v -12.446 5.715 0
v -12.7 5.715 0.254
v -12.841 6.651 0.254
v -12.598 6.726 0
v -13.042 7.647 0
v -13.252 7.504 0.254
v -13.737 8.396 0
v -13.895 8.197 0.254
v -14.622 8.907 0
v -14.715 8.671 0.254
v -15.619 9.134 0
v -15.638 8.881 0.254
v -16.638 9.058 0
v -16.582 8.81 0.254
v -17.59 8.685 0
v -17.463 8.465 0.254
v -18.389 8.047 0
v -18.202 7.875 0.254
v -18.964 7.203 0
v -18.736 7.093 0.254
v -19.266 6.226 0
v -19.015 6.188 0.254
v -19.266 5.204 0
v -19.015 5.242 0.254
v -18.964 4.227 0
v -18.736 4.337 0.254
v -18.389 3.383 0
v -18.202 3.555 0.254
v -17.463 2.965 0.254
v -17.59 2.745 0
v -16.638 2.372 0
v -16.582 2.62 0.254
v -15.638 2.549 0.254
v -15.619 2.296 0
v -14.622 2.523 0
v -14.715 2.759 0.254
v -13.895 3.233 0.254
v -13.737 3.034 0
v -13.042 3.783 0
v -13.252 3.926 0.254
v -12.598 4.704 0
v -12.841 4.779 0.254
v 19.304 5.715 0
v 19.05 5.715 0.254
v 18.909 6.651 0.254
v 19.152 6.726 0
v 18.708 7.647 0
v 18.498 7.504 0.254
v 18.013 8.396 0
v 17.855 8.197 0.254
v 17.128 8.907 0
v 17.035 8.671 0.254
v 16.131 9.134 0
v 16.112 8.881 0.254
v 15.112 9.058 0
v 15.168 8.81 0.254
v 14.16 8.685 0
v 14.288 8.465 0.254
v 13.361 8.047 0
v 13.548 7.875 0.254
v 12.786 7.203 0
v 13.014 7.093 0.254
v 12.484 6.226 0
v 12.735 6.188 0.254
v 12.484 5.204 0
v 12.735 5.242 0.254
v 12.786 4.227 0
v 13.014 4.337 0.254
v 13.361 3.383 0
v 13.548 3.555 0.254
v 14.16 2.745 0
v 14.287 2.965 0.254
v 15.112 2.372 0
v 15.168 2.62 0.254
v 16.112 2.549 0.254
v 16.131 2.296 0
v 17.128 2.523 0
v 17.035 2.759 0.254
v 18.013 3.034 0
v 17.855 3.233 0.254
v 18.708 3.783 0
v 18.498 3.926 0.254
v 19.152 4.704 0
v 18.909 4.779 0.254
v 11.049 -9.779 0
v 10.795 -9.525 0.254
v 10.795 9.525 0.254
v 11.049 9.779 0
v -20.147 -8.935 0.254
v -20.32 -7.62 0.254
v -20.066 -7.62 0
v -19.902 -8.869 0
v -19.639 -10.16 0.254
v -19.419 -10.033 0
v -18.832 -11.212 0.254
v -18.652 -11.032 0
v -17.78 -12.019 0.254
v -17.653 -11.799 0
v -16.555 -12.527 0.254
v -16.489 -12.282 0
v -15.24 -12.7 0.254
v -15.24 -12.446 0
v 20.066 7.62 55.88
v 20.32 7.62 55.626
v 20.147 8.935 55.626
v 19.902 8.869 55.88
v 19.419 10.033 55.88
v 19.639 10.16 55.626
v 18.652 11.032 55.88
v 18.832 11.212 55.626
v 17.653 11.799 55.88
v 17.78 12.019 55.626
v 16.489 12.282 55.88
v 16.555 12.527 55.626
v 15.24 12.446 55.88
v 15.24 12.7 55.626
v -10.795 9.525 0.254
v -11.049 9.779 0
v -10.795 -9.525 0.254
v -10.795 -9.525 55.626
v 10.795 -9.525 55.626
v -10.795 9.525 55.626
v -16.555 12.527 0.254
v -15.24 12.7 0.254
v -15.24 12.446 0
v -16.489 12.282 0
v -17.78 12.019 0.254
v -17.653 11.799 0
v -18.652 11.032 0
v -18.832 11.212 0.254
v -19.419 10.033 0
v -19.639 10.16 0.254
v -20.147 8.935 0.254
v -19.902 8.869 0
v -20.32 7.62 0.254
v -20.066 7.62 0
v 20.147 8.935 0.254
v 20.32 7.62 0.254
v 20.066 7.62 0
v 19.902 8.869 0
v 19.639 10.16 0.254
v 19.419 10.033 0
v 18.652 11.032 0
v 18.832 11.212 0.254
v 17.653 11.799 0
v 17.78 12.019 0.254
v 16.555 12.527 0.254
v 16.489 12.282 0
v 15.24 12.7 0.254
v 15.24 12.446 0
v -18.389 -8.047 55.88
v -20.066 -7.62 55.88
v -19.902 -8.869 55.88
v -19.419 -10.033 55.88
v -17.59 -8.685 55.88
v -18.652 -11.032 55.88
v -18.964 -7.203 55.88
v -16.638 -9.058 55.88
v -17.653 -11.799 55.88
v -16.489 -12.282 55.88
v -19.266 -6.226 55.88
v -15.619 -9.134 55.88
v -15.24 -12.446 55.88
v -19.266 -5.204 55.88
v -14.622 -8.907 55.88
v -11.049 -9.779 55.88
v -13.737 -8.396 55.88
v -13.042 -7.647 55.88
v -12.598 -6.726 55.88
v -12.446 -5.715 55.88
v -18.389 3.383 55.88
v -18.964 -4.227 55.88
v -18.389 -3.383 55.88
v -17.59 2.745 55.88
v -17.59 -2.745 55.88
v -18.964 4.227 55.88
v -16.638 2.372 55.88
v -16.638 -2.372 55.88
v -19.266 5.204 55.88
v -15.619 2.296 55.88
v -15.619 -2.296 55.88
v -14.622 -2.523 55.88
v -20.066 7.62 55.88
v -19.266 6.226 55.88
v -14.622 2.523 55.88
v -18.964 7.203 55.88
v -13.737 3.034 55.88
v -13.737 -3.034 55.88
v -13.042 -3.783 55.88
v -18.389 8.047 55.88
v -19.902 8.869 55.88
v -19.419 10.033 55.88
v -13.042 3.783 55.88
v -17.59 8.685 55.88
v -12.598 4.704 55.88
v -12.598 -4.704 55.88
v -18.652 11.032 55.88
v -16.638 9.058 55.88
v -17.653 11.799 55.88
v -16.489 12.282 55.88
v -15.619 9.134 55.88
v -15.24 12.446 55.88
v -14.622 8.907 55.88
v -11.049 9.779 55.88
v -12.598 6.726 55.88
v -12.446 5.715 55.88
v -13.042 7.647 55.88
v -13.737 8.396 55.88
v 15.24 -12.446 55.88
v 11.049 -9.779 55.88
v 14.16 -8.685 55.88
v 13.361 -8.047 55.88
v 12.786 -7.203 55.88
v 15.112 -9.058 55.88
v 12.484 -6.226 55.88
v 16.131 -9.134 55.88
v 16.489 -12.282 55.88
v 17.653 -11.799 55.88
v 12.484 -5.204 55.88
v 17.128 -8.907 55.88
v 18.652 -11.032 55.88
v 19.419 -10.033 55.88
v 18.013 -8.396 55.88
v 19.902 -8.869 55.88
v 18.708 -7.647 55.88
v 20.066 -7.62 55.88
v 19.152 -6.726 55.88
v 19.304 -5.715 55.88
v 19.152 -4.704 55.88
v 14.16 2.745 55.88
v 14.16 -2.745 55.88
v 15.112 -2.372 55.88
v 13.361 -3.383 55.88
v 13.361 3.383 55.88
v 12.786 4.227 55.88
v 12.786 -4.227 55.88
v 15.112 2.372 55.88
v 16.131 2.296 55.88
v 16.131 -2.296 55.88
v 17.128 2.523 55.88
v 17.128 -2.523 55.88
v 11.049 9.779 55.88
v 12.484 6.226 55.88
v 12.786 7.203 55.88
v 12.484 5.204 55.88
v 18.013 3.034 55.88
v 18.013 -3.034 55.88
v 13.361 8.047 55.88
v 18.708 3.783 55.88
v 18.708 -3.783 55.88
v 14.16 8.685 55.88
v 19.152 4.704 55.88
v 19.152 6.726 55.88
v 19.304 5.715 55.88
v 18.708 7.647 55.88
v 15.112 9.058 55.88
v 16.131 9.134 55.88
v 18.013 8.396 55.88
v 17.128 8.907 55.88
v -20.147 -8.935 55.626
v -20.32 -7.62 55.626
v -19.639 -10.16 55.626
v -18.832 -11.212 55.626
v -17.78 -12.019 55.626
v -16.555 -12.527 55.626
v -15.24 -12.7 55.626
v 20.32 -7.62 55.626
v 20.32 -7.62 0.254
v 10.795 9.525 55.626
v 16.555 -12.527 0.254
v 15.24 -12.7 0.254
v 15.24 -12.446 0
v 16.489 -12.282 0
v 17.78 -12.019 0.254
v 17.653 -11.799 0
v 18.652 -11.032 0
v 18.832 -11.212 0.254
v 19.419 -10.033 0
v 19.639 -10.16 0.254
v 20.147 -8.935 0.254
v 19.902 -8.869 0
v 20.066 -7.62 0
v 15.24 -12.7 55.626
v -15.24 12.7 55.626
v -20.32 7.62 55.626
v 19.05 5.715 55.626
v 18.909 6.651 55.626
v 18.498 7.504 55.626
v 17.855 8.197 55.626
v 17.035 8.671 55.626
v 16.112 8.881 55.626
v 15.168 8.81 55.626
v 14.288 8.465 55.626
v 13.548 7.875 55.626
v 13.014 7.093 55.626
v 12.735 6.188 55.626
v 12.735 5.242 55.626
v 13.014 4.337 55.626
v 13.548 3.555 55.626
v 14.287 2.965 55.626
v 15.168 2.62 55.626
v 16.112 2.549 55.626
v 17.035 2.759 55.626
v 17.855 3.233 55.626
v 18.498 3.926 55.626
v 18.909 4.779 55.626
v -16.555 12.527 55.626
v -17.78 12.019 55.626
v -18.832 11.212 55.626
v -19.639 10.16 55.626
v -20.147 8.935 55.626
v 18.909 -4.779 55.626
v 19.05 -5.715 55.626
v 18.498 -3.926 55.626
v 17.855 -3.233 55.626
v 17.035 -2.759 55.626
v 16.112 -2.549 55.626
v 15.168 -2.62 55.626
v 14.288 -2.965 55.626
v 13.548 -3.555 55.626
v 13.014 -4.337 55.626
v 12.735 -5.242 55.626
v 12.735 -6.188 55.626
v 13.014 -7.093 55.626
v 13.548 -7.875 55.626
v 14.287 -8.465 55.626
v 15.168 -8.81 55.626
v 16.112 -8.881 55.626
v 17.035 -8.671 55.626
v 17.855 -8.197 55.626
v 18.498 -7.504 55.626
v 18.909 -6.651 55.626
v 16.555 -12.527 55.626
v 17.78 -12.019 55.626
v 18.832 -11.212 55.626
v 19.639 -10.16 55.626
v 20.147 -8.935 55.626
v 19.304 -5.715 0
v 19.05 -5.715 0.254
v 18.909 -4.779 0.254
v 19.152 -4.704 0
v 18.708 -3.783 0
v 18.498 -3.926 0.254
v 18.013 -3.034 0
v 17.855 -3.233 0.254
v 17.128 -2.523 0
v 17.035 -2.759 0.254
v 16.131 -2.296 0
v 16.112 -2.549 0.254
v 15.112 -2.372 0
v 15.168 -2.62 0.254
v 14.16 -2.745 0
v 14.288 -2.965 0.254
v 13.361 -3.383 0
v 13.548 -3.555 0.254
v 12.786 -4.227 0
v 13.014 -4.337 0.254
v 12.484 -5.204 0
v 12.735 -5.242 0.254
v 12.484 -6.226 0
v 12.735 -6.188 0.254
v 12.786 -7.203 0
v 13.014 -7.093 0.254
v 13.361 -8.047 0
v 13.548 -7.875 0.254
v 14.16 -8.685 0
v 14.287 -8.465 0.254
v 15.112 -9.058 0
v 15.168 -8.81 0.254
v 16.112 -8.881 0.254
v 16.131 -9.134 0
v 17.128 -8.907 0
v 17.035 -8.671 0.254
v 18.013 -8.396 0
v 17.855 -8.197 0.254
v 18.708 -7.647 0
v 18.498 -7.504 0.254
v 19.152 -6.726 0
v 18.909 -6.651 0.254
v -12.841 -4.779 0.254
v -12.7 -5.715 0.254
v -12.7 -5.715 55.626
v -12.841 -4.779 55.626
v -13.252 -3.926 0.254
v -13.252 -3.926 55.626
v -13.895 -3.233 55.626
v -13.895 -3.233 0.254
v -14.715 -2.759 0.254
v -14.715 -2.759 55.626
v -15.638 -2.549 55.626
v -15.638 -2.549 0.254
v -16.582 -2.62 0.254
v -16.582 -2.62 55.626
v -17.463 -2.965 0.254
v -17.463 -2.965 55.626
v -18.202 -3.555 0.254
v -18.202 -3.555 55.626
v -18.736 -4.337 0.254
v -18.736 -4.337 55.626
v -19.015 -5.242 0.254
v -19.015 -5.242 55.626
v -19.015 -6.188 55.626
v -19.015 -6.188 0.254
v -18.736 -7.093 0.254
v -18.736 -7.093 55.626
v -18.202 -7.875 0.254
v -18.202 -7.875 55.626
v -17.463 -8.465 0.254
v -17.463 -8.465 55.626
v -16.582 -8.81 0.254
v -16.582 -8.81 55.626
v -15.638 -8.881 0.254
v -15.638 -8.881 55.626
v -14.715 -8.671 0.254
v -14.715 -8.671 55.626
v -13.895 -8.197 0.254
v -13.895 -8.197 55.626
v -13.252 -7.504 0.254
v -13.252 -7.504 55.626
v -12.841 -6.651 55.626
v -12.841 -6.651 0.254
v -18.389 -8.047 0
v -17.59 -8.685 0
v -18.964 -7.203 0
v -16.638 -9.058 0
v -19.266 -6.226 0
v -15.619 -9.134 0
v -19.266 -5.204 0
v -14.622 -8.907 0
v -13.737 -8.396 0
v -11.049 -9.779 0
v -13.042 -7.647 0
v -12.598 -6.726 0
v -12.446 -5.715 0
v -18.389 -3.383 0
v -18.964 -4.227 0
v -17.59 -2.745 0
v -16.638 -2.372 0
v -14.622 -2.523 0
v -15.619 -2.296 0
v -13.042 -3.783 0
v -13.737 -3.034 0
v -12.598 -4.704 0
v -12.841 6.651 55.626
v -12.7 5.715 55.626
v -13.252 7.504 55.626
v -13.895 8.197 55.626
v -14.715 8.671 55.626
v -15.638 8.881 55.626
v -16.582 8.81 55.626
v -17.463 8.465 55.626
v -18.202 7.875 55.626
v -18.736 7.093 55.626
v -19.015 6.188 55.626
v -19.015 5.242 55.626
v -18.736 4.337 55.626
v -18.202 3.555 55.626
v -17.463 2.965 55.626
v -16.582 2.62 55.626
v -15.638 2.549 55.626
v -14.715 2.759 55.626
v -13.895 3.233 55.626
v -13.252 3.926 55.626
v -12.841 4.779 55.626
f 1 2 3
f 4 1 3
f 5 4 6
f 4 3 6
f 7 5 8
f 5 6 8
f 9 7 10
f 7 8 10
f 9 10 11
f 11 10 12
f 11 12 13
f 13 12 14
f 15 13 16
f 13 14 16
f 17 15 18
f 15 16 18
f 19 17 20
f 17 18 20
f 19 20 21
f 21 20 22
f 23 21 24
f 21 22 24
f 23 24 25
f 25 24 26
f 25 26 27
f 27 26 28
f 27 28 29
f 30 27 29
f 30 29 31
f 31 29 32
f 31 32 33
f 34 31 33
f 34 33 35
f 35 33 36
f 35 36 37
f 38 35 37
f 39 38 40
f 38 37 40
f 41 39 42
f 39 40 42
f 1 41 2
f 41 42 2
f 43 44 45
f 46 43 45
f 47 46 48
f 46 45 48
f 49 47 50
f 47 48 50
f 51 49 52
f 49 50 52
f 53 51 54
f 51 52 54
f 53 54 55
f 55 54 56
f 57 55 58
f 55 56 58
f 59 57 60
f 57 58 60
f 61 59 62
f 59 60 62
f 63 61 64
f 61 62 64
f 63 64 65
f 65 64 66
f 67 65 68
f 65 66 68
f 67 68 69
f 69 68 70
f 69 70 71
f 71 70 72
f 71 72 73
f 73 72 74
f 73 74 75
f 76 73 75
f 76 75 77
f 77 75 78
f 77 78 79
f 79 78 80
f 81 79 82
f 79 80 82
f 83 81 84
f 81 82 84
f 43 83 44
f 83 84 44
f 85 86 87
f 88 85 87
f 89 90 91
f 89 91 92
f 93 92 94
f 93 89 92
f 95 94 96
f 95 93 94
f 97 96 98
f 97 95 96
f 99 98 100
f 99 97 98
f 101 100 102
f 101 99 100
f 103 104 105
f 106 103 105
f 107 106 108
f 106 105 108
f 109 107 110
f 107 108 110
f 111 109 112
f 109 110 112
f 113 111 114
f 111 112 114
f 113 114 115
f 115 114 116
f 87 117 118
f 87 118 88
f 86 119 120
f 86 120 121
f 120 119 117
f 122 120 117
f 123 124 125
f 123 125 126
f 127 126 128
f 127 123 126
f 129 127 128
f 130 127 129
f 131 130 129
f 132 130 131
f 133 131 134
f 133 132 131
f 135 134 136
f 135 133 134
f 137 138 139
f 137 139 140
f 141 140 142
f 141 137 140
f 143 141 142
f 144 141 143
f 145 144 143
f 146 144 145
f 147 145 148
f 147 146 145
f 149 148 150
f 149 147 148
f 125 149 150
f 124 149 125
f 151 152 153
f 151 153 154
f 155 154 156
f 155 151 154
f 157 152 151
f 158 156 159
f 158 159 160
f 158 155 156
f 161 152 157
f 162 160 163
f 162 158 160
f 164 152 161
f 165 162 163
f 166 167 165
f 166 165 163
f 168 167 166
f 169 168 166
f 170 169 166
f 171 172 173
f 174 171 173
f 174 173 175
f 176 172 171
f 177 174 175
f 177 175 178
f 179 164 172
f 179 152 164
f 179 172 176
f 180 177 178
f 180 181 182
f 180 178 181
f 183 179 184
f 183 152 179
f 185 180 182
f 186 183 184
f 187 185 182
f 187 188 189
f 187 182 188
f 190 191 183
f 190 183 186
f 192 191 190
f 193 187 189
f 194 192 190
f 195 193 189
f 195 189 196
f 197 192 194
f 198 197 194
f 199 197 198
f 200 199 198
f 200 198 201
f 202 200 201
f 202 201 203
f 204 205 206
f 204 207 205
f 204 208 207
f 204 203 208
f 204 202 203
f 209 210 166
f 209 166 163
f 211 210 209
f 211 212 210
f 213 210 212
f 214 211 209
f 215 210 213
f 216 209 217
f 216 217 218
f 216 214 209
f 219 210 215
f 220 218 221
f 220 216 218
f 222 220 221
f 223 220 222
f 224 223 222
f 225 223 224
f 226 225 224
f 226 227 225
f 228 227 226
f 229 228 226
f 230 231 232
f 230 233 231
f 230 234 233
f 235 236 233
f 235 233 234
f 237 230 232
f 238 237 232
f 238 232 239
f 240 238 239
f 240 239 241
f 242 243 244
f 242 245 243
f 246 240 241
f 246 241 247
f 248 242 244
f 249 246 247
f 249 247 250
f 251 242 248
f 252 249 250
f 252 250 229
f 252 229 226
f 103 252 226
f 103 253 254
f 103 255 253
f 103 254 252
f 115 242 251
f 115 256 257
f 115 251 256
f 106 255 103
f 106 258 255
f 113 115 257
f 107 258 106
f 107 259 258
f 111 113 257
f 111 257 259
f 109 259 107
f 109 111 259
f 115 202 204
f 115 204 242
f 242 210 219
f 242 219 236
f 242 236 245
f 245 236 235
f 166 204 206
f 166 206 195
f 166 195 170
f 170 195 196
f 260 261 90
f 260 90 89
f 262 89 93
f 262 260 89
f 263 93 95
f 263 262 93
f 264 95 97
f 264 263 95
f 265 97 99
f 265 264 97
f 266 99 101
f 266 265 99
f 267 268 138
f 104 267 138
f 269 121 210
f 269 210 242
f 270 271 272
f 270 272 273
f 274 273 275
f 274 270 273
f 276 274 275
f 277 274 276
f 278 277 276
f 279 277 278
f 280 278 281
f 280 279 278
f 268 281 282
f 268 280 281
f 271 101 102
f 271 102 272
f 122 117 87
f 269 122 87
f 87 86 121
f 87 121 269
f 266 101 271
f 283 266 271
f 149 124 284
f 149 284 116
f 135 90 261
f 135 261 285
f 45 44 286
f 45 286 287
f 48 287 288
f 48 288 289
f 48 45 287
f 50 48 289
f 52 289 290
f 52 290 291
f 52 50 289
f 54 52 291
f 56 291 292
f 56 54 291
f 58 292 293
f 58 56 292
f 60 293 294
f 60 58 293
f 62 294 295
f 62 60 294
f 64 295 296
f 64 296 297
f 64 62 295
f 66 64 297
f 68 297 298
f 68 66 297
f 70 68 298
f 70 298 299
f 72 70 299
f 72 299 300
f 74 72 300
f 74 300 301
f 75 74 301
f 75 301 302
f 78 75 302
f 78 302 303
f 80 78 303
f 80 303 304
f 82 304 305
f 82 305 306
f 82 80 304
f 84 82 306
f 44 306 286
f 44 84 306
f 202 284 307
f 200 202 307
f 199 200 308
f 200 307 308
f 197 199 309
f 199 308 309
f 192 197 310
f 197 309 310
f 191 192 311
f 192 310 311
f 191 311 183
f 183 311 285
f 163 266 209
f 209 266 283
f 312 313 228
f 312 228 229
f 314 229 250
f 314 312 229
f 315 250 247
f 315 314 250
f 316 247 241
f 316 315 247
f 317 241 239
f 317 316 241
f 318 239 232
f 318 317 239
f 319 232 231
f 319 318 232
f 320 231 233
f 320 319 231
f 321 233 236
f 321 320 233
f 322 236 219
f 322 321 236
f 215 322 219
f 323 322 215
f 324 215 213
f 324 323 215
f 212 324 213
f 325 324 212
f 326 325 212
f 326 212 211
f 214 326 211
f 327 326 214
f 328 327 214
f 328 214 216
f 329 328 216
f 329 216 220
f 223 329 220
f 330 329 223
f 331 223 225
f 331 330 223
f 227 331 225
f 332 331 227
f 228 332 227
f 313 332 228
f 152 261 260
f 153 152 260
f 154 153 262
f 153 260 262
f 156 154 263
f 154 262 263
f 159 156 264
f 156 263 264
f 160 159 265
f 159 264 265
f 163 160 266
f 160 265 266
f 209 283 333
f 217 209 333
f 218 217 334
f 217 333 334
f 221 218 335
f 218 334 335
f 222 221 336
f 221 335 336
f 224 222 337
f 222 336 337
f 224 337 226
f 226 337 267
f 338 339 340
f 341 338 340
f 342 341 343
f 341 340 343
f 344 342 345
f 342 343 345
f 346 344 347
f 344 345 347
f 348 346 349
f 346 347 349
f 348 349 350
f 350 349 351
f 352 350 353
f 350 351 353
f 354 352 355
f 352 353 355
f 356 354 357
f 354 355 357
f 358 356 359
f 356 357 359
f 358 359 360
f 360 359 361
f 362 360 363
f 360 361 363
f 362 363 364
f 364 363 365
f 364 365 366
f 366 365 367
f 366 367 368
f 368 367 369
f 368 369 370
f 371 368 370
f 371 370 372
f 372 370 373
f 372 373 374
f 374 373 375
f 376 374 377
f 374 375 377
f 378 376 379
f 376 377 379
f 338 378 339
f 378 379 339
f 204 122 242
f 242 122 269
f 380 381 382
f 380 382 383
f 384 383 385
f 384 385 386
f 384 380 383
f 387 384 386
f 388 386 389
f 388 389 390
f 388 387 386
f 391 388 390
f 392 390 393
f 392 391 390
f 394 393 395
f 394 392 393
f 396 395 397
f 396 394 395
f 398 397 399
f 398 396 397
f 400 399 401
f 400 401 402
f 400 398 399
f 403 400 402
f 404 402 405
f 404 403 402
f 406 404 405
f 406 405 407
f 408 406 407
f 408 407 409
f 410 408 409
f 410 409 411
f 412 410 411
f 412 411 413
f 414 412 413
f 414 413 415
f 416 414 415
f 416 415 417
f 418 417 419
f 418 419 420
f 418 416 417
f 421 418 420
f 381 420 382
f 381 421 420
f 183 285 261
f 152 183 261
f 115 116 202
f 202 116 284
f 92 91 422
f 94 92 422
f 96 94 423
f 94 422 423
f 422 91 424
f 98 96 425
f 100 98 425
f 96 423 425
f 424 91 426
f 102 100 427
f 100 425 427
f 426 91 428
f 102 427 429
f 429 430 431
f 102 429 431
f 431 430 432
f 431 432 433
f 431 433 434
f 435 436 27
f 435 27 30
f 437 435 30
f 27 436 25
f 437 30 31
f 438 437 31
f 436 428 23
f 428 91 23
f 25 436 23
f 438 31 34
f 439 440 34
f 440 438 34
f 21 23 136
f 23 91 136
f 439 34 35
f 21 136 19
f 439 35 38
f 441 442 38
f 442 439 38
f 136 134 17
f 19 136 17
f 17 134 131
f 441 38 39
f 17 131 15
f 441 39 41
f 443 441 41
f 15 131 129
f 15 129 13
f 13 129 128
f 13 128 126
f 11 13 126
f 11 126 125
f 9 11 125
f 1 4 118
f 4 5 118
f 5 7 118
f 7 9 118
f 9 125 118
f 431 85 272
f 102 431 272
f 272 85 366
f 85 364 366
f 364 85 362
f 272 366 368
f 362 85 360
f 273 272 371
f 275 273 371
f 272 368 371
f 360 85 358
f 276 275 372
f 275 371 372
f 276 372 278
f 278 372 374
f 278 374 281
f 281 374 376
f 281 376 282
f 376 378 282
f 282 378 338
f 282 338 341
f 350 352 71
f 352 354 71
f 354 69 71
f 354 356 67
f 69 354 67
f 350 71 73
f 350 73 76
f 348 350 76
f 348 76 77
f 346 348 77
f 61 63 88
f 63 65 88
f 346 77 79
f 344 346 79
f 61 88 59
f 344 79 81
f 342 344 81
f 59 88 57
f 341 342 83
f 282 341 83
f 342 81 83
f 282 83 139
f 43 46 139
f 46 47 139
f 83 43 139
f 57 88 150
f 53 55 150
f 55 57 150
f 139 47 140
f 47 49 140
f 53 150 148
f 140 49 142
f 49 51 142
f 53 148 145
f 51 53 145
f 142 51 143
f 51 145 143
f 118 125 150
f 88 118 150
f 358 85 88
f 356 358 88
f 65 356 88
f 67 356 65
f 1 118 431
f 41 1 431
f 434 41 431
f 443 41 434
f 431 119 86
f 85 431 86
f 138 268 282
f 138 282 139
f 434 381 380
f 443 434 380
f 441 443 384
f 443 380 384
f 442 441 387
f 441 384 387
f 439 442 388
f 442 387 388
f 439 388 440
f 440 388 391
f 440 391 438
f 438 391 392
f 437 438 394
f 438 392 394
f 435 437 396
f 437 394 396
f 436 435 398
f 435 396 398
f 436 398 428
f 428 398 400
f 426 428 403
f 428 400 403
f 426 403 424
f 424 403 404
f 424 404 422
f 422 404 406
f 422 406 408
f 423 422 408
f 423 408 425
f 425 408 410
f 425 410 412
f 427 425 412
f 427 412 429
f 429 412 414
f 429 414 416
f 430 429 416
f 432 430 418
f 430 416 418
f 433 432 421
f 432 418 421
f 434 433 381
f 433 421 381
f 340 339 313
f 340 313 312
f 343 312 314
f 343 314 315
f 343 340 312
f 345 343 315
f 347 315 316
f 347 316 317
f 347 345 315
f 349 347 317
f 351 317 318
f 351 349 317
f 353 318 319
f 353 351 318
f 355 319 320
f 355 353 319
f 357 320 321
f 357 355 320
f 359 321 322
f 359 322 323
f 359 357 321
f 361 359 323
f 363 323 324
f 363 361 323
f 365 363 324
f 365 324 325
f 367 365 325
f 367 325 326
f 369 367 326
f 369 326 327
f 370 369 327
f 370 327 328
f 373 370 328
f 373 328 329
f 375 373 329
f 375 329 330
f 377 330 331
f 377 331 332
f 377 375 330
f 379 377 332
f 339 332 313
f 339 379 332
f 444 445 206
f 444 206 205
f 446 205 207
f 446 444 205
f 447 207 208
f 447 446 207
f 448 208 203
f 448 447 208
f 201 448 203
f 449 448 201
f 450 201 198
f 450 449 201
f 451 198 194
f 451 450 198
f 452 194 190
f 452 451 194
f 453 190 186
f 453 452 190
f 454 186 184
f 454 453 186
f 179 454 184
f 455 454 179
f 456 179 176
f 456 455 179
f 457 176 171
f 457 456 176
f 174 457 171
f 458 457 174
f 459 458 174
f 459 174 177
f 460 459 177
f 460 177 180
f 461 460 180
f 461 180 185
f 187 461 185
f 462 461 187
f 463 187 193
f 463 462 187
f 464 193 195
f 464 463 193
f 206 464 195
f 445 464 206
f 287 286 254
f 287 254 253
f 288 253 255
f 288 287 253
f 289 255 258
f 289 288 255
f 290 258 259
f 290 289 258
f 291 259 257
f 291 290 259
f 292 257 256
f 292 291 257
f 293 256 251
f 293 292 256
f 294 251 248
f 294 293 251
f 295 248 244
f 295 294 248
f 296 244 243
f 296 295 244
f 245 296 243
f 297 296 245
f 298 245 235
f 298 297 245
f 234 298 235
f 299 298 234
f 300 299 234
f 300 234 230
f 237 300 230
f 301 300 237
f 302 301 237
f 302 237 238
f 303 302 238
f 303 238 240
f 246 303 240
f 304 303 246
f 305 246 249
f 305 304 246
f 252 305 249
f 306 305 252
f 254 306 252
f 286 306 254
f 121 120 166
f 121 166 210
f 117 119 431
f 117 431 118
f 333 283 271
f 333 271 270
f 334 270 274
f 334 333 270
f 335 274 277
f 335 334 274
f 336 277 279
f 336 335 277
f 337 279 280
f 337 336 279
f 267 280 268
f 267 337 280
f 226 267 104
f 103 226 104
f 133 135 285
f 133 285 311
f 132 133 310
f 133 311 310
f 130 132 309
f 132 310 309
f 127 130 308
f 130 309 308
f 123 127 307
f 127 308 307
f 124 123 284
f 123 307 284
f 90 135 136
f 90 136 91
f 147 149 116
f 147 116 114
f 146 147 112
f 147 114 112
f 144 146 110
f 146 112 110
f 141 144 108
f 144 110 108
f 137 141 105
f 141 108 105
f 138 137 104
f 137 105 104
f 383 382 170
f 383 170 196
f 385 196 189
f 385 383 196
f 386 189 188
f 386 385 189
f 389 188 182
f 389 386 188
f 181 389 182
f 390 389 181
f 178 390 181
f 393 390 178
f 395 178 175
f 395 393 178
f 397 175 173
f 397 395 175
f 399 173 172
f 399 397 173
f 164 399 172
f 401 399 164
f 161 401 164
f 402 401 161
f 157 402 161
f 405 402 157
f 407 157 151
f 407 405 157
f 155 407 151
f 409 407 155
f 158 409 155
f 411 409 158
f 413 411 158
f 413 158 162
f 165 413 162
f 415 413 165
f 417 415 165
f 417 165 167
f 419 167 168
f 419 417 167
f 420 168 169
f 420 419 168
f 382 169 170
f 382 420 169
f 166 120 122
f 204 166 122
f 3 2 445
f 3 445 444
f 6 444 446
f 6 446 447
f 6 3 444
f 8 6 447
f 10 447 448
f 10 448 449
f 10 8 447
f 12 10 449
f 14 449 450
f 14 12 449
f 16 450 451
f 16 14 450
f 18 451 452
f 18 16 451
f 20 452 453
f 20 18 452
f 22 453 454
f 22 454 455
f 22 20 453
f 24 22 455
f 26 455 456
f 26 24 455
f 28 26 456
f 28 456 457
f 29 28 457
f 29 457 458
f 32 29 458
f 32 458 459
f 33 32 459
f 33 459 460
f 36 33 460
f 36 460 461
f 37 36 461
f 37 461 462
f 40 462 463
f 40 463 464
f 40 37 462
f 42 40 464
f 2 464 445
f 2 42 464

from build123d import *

# Parameters (mm, degrees)
SKETCH1_W           = 40.64
SKETCH1_H           = 25.4
SKETCH1_R           = 3.175
SKETCH1_W_2         = 21.59
SKETCH1_H_2         = 19.05
BOSS_EXTRUDE1_DEPTH = 55.88
FILLET1_R           = 5.08
CHAMFER1_SIZE       = 0.254


with BuildPart() as part:
    # Sketch1 → Boss-Extrude1 (new body)
    with BuildSketch(Plane.XY):
        Rectangle(SKETCH1_W, SKETCH1_H)
        with Locations((-15.875, 5.715)):
            Circle(SKETCH1_R, mode=Mode.SUBTRACT)
        with Locations((15.875, 5.715)):
            Circle(SKETCH1_R, mode=Mode.SUBTRACT)
        with Locations((15.875, -5.715)):
            Circle(SKETCH1_R, mode=Mode.SUBTRACT)
        with Locations((-15.875, -5.715)):
            Circle(SKETCH1_R, mode=Mode.SUBTRACT)
        Rectangle(SKETCH1_W_2, SKETCH1_H_2, mode=Mode.SUBTRACT)
    extrude(amount=BOSS_EXTRUDE1_DEPTH)

    # Fillet1
    fillet1_edges = [part.edges().sort_by_distance(p)[0] for p in [
        (20.32, -12.7, 27.94),
        (-20.32, -12.7, 27.94),
        (-20.32, 12.7, 27.94),
        (20.32, 12.7, 27.94),
    ]]
    fillet(fillet1_edges, radius=FILLET1_R)

    # Chamfer1
    chamfer1_edges = [part.edges().sort_by_distance(p)[0] for p in [
        (-19.05, 5.715, 0),
        (-19.05, 5.715, 55.88),
        (12.7, 5.715, 0),
        (12.7, 5.715, 55.88),
        (12.7, -5.715, 0),
        (12.7, -5.715, 55.88),
        (-19.05, -5.715, 0),
        (-19.05, -5.715, 55.88),
        (10.795, 0, 0),
        (0, 9.525, 0),
        (-10.795, 0, 0),
        (0, -9.525, 0),
        (10.795, 0, 55.88),
        (0, 9.525, 55.88),
        (-10.795, 0, 55.88),
        (0, -9.525, 55.88),
        (0, -12.7, 0),
        (0, -12.7, 55.88),
        (20.32, 0, 0),
        (-20.32, 0, 0),
        (0, 12.7, 0),
        (-18.832102448, 11.212102448, 0),
        (18.832102448, 11.212102448, 0),
        (18.832102448, -11.212102448, 0),
        (-18.832102448, -11.212102448, 0),
        (-20.32, 0, 55.88),
        (20.32, 0, 55.88),
        (0, 12.7, 55.88),
        (-18.832102448, 11.212102448, 55.88),
        (18.832102448, 11.212102448, 55.88),
        (18.832102448, -11.212102448, 55.88),
        (-18.832102448, -11.212102448, 55.88),
    ]]
    chamfer(chamfer1_edges, length=CHAMFER1_SIZE)


solid = part.part
